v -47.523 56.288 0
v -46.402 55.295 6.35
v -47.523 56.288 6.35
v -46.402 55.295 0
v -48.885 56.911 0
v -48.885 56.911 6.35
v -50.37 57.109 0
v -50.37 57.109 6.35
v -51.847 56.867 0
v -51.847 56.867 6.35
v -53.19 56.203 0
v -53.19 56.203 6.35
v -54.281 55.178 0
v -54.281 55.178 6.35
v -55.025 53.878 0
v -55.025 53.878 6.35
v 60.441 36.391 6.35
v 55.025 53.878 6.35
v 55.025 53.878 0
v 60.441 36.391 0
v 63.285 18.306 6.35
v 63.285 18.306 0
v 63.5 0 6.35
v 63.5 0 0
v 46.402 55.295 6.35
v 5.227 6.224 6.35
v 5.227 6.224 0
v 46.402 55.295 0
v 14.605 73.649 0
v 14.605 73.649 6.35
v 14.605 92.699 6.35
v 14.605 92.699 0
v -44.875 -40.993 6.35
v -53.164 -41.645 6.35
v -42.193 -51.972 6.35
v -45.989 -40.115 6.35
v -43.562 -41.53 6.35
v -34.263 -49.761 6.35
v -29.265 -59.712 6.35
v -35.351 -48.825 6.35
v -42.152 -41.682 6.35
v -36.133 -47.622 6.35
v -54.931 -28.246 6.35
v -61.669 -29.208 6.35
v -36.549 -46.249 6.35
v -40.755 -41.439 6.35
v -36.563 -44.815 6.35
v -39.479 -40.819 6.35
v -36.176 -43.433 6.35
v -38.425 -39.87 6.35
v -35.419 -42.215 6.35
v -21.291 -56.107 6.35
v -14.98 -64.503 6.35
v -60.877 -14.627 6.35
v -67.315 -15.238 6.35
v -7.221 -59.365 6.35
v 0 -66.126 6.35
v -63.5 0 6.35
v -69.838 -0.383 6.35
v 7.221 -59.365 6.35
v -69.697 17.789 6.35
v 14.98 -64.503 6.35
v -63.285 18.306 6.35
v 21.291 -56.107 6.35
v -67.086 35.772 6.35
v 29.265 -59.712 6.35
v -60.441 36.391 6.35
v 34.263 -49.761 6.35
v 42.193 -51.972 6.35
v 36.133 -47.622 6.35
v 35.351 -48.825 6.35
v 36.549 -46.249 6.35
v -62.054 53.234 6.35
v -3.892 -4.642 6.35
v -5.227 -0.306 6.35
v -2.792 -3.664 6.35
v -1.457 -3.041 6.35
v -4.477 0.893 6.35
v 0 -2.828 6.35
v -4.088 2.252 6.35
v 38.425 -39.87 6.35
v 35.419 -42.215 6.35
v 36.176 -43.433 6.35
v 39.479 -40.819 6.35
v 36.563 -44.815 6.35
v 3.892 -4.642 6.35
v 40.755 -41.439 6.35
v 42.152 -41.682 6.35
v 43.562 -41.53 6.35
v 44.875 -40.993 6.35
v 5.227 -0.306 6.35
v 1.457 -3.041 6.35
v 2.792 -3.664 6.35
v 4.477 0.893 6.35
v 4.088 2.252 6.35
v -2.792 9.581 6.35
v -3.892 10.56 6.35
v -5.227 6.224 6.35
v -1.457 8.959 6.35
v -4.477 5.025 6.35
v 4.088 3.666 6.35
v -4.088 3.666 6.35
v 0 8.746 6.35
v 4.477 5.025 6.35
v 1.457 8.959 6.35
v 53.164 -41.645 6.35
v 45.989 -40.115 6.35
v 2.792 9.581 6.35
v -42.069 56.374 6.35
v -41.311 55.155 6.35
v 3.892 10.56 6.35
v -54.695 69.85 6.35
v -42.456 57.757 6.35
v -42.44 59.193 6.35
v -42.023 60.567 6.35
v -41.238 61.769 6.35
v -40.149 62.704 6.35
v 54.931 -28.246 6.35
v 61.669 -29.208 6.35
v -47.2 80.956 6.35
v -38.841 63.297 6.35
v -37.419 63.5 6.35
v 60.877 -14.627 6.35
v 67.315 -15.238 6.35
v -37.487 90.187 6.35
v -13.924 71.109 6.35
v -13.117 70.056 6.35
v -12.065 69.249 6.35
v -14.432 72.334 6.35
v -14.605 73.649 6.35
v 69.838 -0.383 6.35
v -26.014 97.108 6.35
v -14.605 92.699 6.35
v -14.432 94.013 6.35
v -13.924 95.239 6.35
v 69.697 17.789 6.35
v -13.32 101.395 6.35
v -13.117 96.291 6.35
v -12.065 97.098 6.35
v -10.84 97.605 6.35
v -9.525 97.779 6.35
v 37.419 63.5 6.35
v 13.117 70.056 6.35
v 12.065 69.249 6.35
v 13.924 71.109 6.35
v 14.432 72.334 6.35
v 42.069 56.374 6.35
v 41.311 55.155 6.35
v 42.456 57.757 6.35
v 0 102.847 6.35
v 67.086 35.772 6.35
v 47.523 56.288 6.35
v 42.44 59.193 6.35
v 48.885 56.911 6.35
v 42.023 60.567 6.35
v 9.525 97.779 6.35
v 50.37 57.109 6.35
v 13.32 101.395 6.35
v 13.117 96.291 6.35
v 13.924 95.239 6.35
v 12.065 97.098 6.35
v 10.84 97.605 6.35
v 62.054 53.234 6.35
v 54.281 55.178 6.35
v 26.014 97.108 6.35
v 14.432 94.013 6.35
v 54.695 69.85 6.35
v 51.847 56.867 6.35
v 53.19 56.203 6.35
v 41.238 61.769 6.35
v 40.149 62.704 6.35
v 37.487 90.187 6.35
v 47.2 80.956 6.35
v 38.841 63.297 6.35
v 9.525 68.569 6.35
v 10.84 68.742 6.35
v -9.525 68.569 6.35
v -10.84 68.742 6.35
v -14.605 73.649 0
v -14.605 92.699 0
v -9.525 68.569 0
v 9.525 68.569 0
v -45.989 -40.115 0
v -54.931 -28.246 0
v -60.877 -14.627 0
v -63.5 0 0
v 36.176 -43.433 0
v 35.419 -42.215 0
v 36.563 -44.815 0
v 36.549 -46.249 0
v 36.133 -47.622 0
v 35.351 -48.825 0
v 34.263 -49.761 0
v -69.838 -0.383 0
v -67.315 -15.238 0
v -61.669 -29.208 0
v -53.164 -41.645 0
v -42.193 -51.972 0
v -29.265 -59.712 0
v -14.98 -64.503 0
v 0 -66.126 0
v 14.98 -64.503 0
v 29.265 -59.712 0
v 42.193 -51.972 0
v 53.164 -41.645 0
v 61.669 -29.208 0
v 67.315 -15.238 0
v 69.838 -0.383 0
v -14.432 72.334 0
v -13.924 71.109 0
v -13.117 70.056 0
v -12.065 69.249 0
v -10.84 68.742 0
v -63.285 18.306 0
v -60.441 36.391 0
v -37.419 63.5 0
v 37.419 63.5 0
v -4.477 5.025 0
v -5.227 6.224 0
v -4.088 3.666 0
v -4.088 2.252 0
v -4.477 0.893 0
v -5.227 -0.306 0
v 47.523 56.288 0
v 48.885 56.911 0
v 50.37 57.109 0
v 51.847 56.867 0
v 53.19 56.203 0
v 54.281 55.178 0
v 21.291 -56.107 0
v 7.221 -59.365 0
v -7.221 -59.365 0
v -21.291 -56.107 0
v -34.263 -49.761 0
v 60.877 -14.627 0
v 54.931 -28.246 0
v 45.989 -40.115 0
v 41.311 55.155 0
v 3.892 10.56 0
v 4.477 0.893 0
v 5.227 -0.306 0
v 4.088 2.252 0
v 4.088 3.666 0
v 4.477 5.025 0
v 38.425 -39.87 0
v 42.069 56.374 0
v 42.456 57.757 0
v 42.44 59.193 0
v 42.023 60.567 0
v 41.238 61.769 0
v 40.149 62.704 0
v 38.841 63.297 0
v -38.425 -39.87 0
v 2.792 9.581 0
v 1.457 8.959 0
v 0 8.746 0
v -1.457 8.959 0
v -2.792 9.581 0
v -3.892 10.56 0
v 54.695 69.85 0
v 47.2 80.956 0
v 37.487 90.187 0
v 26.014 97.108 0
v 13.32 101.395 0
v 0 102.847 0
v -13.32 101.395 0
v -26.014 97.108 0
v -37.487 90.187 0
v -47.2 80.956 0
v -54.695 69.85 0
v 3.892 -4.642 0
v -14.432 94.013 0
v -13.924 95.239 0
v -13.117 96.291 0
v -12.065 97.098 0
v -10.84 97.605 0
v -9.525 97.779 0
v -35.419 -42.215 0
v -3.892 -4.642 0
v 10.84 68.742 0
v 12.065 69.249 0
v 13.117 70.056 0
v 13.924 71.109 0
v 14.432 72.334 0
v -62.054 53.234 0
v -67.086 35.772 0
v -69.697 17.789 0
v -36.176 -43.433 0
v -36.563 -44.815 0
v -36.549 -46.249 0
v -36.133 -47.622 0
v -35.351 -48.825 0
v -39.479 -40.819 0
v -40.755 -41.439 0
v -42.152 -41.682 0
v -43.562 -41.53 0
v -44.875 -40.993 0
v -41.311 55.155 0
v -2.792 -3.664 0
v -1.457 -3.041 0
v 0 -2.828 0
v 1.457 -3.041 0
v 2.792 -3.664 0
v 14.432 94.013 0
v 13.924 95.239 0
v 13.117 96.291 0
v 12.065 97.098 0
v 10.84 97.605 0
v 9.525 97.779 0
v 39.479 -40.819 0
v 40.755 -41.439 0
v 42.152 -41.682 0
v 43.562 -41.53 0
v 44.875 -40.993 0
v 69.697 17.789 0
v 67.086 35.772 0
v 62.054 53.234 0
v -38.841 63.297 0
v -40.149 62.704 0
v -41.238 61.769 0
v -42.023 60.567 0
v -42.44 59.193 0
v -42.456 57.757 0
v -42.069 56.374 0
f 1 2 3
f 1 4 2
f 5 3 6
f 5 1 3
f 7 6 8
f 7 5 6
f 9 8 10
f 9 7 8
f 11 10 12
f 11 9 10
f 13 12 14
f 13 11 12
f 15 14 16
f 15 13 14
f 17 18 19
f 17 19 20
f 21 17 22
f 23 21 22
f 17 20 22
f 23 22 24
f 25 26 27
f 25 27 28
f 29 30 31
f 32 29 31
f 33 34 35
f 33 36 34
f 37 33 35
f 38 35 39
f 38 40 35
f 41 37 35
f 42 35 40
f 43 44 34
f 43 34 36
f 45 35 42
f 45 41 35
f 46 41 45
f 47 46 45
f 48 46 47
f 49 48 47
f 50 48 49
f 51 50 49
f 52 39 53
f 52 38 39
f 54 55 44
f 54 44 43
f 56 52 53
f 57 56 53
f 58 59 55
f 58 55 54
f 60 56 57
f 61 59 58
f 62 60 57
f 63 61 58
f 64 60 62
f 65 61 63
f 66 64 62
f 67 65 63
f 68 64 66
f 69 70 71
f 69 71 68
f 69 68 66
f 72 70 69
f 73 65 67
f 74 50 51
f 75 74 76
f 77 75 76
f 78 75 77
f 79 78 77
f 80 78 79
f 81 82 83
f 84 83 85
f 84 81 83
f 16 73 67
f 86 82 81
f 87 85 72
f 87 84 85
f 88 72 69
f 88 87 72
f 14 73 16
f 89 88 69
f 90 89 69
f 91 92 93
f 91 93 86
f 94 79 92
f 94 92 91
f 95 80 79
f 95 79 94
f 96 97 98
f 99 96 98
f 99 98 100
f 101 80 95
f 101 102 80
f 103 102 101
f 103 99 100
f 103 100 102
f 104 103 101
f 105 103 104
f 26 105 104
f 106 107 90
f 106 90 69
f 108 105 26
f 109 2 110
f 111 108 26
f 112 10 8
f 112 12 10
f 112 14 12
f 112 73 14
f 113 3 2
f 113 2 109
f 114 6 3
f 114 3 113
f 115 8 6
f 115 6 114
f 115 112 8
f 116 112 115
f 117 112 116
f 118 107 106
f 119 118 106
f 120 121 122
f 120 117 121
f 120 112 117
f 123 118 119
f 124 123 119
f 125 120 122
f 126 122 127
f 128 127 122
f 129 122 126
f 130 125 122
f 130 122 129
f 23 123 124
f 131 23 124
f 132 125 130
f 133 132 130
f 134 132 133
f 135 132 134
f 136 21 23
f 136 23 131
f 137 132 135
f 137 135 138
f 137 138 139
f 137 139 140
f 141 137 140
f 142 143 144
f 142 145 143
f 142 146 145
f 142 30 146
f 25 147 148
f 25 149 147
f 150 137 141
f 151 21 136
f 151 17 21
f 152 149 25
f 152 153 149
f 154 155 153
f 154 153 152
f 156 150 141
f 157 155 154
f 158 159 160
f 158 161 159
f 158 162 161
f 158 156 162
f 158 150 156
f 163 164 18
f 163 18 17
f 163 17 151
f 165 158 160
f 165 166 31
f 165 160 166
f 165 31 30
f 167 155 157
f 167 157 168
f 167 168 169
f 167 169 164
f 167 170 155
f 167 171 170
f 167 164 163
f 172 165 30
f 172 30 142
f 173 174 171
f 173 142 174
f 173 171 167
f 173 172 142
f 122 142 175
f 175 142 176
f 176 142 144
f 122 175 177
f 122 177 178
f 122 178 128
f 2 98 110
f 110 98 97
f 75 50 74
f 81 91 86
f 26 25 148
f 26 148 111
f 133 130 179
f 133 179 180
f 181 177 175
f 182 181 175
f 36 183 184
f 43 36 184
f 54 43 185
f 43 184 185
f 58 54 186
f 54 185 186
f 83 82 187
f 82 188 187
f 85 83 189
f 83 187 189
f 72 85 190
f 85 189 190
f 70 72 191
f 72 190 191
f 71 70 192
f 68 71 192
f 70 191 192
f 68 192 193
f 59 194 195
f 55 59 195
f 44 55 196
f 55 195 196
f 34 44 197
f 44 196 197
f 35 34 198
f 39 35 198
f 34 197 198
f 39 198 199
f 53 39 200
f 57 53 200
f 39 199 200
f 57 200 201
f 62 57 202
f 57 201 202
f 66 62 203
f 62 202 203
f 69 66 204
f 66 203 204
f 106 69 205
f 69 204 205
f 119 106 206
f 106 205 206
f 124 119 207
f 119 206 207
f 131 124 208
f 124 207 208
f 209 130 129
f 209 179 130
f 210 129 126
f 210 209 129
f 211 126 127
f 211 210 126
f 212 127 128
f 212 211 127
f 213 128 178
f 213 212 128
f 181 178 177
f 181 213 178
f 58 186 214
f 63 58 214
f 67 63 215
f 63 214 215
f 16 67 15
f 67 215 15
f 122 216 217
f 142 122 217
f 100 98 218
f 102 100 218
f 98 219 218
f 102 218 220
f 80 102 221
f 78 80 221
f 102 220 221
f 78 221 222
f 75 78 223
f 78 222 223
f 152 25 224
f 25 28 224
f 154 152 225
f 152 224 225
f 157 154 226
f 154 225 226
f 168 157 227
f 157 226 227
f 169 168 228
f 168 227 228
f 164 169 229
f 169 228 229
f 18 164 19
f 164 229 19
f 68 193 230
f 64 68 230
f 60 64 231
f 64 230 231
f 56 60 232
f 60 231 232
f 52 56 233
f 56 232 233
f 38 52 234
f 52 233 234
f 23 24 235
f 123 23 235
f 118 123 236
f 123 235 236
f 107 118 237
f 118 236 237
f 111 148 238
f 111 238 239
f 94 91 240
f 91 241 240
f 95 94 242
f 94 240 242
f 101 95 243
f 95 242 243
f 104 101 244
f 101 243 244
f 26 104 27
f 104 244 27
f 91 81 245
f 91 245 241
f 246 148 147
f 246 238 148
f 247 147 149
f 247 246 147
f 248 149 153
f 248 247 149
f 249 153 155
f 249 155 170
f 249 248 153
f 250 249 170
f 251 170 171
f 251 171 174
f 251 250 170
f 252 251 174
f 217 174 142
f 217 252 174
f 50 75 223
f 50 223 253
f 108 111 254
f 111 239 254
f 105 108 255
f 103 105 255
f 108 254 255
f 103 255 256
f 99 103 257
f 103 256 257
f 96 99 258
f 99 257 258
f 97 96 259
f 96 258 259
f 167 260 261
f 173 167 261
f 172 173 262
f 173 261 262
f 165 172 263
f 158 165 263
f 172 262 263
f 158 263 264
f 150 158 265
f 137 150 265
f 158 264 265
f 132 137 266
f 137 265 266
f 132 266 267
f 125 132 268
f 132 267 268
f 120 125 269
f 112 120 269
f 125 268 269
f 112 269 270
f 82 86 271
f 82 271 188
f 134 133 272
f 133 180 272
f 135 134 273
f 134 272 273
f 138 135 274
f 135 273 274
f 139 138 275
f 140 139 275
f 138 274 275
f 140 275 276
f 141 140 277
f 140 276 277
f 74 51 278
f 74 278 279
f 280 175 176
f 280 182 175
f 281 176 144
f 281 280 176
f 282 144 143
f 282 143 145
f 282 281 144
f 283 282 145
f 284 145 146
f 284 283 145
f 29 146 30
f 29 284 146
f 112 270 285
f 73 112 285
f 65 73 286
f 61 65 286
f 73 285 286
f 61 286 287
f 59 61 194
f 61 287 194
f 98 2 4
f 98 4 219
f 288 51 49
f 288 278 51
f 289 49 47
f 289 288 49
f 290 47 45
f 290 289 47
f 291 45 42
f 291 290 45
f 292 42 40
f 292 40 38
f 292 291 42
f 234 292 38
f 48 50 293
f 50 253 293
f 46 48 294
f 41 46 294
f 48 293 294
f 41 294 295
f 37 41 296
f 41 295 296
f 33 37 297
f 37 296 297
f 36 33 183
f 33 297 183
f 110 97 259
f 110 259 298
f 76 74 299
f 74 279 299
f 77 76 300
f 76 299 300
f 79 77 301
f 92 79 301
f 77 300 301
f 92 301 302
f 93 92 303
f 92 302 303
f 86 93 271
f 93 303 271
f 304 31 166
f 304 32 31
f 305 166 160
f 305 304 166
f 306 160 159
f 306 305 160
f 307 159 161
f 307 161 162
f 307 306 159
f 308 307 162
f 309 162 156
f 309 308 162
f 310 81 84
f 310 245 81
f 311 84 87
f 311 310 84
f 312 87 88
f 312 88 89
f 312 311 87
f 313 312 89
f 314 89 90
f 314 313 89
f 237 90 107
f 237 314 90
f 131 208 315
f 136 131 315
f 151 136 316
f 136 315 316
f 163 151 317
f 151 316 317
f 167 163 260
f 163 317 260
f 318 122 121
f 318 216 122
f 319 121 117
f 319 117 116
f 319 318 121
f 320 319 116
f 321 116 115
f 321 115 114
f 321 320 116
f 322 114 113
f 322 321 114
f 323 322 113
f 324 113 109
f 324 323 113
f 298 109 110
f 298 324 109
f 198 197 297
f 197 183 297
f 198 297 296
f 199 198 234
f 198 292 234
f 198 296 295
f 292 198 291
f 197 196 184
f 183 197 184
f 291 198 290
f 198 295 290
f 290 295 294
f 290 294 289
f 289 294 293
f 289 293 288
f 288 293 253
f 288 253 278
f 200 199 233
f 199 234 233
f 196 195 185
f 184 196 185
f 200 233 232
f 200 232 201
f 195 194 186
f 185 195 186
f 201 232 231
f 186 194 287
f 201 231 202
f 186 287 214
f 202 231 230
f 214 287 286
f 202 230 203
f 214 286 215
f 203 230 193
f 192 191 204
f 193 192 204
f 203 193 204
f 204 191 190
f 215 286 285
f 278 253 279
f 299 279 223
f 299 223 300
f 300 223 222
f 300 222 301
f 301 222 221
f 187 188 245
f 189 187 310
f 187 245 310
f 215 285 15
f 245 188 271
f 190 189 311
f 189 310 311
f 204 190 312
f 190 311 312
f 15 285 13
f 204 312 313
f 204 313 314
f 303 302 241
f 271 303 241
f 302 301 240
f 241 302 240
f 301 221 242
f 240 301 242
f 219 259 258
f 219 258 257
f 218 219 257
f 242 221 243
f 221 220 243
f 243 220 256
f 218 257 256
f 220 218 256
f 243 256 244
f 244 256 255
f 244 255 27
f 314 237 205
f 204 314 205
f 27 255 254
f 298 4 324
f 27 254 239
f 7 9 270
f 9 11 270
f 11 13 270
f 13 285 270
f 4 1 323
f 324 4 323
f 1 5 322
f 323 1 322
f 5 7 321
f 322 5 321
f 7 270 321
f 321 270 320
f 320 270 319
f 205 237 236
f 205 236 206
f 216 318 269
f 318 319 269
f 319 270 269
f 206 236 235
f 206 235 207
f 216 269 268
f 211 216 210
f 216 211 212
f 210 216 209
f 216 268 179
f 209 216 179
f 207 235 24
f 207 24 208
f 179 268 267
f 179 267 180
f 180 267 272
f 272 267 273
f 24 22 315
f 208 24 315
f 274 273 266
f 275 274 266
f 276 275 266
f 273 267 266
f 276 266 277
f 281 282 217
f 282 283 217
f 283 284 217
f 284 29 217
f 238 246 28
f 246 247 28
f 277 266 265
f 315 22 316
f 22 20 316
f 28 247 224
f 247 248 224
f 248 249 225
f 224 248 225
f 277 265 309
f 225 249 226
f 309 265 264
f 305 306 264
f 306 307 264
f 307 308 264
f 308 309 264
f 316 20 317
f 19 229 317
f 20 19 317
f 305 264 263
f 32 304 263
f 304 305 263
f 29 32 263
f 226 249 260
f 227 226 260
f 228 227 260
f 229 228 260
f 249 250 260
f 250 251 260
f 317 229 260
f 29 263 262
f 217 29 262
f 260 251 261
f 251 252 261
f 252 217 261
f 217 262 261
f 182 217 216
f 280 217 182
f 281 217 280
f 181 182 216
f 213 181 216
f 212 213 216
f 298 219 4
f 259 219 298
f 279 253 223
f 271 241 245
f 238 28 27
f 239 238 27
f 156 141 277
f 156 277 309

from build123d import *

# Parameters (mm, degrees)
BOSS_EXTRUDE1_DEPTH = 6.35
CUT_EXTRUDE1_REACH  = 8.35
SKETCH2_W           = 29.21
SKETCH2_H           = 29.21
FILLET1_R           = 5.08
BOSS_EXTRUDE2_DEPTH = 6.35
FILLET2_R           = 5.08


with BuildPart() as part:
    # Sketch1 → Boss-Extrude1 (new body)
    with BuildSketch(Plane.XY):
        with BuildLine():
            ThreePointArc((-54.695205109, 69.85), (-67.085998682, 35.772421109), (-69.83842006, -0.383315988))
            ThreePointArc((-69.83842006, -0.383315988), (0, -66.125848112), (69.83842006, -0.383315988))
            ThreePointArc((69.83842006, -0.383315988), (67.085998682, 35.772421109), (54.695205109, 69.85))
            ThreePointArc((54.695205109, 69.85), (0, 102.847096123), (-54.695205109, 69.85))
        make_face()
        with BuildLine():
            Line((-50.8, 63.5), (50.8, 63.5))
            ThreePointArc((50.8, 63.5), (61.265344619, 32.573068924), (63.5, 0))
            ThreePointArc((63.5, 0), (0, -59.775848112), (-63.5, 0))
            ThreePointArc((-63.5, 0), (-61.265344619, 32.573068924), (-50.8, 63.5))
        make_face(mode=Mode.SUBTRACT)
    extrude(amount=BOSS_EXTRUDE1_DEPTH)

    # Sketch2 → Cut-Extrude1 (cut, up to next)
    with BuildSketch(Plane.XY.offset(6.35), mode=Mode.PRIVATE) as cut_extrude1_sk1:
        with Locations((0, 83.173548061)):
            Rectangle(SKETCH2_W, SKETCH2_H)
    cut_extrude1_tool1 = extrude(cut_extrude1_sk1.sketch, amount=-CUT_EXTRUDE1_REACH, mode=Mode.PRIVATE) & part.part
    add(cut_extrude1_tool1.solids().sort_by_distance((0, 83.173548, 6.35))[0], mode=Mode.SUBTRACT)

    # Fillet1
    fillet1_edges = [part.edges().sort_by_distance(p)[0] for p in [
        (14.605, 97.778548061, 3.175),
        (14.605, 68.568548061, 3.175),
        (-14.605, 68.568548061, 3.175),
        (-14.605, 97.778548061, 3.175),
    ]]
    fillet(fillet1_edges, radius=FILLET1_R)

    # Sketch3 → Boss-Extrude2 (add)
    with BuildSketch(Plane.XY.offset(6.35)):
        with BuildLine():
            Line((48.313199114, 63.5), (0, 5.922571386))
            Line((0, 5.922571386), (2.486800886, 2.958917496))
            Line((2.486800886, 2.958917496), (51.704078268, 61.613784634))
            ThreePointArc((51.704078268, 61.613784634), (51.255922445, 62.55875362), (50.8, 63.5))
            Line((50.8, 63.5), (48.313199114, 63.5))
        make_face()
        with BuildLine():
            Line((-48.313199114, 63.5), (-50.8, 63.5))
            ThreePointArc((-50.8, 63.5), (-51.255922445, 62.55875362), (-51.704078268, 61.613784634))
            Line((-51.704078268, 61.613784634), (-2.486800886, 2.958917496))
            Line((-2.486800886, 2.958917496), (0, 5.922571386))
            Line((0, 5.922571386), (-48.313199114, 63.5))
        make_face()
        Polygon((0, 5.922571386), (-2.486800886, 2.958917496), (0, -0.004736394), (2.486800886, 2.958917496), align=None)
        with BuildLine():
            Line((2.486800886, 2.958917496), (0, -0.004736394))
            Line((0, -0.004736394), (38.967470095, -46.444358875))
            ThreePointArc((38.967470095, -46.444358875), (40.455837743, -45.254867888), (41.907916796, -44.021339013))
            Line((41.907916796, -44.021339013), (2.486800886, 2.958917496))
        make_face()
        with BuildLine():
            Line((0, -0.004736394), (-2.486800886, 2.958917496))
            Line((-2.486800886, 2.958917496), (-41.907916796, -44.021339013))
            ThreePointArc((-41.907916796, -44.021339013), (-40.455837743, -45.254867888), (-38.967470095, -46.444358875))
            Line((-38.967470095, -46.444358875), (0, -0.004736394))
        make_face()
    extrude(amount=-BOSS_EXTRUDE2_DEPTH)

    # Fillet2
    fillet2_edges = [part.edges().sort_by_distance(p)[0] for p in [
        (48.313199114, 63.5, 3.175),
        (0, 5.922571386, 3.175),
        (-48.313199114, 63.5, 3.175),
        (-51.704078268, 61.613784634, 3.175),
        (-2.486800886, 2.958917496, 3.175),
        (-41.907916796, -44.021339013, 3.175),
        (-38.967470095, -46.444358875, 3.175),
        (0, -0.004736394, 3.175),
        (38.967470095, -46.444358875, 3.175),
        (41.907916796, -44.021339013, 3.175),
        (2.486800886, 2.958917496, 3.175),
        (51.704078268, 61.613784634, 3.175),
    ]]
    fillet(fillet2_edges, radius=FILLET2_R)


solid = part.part
